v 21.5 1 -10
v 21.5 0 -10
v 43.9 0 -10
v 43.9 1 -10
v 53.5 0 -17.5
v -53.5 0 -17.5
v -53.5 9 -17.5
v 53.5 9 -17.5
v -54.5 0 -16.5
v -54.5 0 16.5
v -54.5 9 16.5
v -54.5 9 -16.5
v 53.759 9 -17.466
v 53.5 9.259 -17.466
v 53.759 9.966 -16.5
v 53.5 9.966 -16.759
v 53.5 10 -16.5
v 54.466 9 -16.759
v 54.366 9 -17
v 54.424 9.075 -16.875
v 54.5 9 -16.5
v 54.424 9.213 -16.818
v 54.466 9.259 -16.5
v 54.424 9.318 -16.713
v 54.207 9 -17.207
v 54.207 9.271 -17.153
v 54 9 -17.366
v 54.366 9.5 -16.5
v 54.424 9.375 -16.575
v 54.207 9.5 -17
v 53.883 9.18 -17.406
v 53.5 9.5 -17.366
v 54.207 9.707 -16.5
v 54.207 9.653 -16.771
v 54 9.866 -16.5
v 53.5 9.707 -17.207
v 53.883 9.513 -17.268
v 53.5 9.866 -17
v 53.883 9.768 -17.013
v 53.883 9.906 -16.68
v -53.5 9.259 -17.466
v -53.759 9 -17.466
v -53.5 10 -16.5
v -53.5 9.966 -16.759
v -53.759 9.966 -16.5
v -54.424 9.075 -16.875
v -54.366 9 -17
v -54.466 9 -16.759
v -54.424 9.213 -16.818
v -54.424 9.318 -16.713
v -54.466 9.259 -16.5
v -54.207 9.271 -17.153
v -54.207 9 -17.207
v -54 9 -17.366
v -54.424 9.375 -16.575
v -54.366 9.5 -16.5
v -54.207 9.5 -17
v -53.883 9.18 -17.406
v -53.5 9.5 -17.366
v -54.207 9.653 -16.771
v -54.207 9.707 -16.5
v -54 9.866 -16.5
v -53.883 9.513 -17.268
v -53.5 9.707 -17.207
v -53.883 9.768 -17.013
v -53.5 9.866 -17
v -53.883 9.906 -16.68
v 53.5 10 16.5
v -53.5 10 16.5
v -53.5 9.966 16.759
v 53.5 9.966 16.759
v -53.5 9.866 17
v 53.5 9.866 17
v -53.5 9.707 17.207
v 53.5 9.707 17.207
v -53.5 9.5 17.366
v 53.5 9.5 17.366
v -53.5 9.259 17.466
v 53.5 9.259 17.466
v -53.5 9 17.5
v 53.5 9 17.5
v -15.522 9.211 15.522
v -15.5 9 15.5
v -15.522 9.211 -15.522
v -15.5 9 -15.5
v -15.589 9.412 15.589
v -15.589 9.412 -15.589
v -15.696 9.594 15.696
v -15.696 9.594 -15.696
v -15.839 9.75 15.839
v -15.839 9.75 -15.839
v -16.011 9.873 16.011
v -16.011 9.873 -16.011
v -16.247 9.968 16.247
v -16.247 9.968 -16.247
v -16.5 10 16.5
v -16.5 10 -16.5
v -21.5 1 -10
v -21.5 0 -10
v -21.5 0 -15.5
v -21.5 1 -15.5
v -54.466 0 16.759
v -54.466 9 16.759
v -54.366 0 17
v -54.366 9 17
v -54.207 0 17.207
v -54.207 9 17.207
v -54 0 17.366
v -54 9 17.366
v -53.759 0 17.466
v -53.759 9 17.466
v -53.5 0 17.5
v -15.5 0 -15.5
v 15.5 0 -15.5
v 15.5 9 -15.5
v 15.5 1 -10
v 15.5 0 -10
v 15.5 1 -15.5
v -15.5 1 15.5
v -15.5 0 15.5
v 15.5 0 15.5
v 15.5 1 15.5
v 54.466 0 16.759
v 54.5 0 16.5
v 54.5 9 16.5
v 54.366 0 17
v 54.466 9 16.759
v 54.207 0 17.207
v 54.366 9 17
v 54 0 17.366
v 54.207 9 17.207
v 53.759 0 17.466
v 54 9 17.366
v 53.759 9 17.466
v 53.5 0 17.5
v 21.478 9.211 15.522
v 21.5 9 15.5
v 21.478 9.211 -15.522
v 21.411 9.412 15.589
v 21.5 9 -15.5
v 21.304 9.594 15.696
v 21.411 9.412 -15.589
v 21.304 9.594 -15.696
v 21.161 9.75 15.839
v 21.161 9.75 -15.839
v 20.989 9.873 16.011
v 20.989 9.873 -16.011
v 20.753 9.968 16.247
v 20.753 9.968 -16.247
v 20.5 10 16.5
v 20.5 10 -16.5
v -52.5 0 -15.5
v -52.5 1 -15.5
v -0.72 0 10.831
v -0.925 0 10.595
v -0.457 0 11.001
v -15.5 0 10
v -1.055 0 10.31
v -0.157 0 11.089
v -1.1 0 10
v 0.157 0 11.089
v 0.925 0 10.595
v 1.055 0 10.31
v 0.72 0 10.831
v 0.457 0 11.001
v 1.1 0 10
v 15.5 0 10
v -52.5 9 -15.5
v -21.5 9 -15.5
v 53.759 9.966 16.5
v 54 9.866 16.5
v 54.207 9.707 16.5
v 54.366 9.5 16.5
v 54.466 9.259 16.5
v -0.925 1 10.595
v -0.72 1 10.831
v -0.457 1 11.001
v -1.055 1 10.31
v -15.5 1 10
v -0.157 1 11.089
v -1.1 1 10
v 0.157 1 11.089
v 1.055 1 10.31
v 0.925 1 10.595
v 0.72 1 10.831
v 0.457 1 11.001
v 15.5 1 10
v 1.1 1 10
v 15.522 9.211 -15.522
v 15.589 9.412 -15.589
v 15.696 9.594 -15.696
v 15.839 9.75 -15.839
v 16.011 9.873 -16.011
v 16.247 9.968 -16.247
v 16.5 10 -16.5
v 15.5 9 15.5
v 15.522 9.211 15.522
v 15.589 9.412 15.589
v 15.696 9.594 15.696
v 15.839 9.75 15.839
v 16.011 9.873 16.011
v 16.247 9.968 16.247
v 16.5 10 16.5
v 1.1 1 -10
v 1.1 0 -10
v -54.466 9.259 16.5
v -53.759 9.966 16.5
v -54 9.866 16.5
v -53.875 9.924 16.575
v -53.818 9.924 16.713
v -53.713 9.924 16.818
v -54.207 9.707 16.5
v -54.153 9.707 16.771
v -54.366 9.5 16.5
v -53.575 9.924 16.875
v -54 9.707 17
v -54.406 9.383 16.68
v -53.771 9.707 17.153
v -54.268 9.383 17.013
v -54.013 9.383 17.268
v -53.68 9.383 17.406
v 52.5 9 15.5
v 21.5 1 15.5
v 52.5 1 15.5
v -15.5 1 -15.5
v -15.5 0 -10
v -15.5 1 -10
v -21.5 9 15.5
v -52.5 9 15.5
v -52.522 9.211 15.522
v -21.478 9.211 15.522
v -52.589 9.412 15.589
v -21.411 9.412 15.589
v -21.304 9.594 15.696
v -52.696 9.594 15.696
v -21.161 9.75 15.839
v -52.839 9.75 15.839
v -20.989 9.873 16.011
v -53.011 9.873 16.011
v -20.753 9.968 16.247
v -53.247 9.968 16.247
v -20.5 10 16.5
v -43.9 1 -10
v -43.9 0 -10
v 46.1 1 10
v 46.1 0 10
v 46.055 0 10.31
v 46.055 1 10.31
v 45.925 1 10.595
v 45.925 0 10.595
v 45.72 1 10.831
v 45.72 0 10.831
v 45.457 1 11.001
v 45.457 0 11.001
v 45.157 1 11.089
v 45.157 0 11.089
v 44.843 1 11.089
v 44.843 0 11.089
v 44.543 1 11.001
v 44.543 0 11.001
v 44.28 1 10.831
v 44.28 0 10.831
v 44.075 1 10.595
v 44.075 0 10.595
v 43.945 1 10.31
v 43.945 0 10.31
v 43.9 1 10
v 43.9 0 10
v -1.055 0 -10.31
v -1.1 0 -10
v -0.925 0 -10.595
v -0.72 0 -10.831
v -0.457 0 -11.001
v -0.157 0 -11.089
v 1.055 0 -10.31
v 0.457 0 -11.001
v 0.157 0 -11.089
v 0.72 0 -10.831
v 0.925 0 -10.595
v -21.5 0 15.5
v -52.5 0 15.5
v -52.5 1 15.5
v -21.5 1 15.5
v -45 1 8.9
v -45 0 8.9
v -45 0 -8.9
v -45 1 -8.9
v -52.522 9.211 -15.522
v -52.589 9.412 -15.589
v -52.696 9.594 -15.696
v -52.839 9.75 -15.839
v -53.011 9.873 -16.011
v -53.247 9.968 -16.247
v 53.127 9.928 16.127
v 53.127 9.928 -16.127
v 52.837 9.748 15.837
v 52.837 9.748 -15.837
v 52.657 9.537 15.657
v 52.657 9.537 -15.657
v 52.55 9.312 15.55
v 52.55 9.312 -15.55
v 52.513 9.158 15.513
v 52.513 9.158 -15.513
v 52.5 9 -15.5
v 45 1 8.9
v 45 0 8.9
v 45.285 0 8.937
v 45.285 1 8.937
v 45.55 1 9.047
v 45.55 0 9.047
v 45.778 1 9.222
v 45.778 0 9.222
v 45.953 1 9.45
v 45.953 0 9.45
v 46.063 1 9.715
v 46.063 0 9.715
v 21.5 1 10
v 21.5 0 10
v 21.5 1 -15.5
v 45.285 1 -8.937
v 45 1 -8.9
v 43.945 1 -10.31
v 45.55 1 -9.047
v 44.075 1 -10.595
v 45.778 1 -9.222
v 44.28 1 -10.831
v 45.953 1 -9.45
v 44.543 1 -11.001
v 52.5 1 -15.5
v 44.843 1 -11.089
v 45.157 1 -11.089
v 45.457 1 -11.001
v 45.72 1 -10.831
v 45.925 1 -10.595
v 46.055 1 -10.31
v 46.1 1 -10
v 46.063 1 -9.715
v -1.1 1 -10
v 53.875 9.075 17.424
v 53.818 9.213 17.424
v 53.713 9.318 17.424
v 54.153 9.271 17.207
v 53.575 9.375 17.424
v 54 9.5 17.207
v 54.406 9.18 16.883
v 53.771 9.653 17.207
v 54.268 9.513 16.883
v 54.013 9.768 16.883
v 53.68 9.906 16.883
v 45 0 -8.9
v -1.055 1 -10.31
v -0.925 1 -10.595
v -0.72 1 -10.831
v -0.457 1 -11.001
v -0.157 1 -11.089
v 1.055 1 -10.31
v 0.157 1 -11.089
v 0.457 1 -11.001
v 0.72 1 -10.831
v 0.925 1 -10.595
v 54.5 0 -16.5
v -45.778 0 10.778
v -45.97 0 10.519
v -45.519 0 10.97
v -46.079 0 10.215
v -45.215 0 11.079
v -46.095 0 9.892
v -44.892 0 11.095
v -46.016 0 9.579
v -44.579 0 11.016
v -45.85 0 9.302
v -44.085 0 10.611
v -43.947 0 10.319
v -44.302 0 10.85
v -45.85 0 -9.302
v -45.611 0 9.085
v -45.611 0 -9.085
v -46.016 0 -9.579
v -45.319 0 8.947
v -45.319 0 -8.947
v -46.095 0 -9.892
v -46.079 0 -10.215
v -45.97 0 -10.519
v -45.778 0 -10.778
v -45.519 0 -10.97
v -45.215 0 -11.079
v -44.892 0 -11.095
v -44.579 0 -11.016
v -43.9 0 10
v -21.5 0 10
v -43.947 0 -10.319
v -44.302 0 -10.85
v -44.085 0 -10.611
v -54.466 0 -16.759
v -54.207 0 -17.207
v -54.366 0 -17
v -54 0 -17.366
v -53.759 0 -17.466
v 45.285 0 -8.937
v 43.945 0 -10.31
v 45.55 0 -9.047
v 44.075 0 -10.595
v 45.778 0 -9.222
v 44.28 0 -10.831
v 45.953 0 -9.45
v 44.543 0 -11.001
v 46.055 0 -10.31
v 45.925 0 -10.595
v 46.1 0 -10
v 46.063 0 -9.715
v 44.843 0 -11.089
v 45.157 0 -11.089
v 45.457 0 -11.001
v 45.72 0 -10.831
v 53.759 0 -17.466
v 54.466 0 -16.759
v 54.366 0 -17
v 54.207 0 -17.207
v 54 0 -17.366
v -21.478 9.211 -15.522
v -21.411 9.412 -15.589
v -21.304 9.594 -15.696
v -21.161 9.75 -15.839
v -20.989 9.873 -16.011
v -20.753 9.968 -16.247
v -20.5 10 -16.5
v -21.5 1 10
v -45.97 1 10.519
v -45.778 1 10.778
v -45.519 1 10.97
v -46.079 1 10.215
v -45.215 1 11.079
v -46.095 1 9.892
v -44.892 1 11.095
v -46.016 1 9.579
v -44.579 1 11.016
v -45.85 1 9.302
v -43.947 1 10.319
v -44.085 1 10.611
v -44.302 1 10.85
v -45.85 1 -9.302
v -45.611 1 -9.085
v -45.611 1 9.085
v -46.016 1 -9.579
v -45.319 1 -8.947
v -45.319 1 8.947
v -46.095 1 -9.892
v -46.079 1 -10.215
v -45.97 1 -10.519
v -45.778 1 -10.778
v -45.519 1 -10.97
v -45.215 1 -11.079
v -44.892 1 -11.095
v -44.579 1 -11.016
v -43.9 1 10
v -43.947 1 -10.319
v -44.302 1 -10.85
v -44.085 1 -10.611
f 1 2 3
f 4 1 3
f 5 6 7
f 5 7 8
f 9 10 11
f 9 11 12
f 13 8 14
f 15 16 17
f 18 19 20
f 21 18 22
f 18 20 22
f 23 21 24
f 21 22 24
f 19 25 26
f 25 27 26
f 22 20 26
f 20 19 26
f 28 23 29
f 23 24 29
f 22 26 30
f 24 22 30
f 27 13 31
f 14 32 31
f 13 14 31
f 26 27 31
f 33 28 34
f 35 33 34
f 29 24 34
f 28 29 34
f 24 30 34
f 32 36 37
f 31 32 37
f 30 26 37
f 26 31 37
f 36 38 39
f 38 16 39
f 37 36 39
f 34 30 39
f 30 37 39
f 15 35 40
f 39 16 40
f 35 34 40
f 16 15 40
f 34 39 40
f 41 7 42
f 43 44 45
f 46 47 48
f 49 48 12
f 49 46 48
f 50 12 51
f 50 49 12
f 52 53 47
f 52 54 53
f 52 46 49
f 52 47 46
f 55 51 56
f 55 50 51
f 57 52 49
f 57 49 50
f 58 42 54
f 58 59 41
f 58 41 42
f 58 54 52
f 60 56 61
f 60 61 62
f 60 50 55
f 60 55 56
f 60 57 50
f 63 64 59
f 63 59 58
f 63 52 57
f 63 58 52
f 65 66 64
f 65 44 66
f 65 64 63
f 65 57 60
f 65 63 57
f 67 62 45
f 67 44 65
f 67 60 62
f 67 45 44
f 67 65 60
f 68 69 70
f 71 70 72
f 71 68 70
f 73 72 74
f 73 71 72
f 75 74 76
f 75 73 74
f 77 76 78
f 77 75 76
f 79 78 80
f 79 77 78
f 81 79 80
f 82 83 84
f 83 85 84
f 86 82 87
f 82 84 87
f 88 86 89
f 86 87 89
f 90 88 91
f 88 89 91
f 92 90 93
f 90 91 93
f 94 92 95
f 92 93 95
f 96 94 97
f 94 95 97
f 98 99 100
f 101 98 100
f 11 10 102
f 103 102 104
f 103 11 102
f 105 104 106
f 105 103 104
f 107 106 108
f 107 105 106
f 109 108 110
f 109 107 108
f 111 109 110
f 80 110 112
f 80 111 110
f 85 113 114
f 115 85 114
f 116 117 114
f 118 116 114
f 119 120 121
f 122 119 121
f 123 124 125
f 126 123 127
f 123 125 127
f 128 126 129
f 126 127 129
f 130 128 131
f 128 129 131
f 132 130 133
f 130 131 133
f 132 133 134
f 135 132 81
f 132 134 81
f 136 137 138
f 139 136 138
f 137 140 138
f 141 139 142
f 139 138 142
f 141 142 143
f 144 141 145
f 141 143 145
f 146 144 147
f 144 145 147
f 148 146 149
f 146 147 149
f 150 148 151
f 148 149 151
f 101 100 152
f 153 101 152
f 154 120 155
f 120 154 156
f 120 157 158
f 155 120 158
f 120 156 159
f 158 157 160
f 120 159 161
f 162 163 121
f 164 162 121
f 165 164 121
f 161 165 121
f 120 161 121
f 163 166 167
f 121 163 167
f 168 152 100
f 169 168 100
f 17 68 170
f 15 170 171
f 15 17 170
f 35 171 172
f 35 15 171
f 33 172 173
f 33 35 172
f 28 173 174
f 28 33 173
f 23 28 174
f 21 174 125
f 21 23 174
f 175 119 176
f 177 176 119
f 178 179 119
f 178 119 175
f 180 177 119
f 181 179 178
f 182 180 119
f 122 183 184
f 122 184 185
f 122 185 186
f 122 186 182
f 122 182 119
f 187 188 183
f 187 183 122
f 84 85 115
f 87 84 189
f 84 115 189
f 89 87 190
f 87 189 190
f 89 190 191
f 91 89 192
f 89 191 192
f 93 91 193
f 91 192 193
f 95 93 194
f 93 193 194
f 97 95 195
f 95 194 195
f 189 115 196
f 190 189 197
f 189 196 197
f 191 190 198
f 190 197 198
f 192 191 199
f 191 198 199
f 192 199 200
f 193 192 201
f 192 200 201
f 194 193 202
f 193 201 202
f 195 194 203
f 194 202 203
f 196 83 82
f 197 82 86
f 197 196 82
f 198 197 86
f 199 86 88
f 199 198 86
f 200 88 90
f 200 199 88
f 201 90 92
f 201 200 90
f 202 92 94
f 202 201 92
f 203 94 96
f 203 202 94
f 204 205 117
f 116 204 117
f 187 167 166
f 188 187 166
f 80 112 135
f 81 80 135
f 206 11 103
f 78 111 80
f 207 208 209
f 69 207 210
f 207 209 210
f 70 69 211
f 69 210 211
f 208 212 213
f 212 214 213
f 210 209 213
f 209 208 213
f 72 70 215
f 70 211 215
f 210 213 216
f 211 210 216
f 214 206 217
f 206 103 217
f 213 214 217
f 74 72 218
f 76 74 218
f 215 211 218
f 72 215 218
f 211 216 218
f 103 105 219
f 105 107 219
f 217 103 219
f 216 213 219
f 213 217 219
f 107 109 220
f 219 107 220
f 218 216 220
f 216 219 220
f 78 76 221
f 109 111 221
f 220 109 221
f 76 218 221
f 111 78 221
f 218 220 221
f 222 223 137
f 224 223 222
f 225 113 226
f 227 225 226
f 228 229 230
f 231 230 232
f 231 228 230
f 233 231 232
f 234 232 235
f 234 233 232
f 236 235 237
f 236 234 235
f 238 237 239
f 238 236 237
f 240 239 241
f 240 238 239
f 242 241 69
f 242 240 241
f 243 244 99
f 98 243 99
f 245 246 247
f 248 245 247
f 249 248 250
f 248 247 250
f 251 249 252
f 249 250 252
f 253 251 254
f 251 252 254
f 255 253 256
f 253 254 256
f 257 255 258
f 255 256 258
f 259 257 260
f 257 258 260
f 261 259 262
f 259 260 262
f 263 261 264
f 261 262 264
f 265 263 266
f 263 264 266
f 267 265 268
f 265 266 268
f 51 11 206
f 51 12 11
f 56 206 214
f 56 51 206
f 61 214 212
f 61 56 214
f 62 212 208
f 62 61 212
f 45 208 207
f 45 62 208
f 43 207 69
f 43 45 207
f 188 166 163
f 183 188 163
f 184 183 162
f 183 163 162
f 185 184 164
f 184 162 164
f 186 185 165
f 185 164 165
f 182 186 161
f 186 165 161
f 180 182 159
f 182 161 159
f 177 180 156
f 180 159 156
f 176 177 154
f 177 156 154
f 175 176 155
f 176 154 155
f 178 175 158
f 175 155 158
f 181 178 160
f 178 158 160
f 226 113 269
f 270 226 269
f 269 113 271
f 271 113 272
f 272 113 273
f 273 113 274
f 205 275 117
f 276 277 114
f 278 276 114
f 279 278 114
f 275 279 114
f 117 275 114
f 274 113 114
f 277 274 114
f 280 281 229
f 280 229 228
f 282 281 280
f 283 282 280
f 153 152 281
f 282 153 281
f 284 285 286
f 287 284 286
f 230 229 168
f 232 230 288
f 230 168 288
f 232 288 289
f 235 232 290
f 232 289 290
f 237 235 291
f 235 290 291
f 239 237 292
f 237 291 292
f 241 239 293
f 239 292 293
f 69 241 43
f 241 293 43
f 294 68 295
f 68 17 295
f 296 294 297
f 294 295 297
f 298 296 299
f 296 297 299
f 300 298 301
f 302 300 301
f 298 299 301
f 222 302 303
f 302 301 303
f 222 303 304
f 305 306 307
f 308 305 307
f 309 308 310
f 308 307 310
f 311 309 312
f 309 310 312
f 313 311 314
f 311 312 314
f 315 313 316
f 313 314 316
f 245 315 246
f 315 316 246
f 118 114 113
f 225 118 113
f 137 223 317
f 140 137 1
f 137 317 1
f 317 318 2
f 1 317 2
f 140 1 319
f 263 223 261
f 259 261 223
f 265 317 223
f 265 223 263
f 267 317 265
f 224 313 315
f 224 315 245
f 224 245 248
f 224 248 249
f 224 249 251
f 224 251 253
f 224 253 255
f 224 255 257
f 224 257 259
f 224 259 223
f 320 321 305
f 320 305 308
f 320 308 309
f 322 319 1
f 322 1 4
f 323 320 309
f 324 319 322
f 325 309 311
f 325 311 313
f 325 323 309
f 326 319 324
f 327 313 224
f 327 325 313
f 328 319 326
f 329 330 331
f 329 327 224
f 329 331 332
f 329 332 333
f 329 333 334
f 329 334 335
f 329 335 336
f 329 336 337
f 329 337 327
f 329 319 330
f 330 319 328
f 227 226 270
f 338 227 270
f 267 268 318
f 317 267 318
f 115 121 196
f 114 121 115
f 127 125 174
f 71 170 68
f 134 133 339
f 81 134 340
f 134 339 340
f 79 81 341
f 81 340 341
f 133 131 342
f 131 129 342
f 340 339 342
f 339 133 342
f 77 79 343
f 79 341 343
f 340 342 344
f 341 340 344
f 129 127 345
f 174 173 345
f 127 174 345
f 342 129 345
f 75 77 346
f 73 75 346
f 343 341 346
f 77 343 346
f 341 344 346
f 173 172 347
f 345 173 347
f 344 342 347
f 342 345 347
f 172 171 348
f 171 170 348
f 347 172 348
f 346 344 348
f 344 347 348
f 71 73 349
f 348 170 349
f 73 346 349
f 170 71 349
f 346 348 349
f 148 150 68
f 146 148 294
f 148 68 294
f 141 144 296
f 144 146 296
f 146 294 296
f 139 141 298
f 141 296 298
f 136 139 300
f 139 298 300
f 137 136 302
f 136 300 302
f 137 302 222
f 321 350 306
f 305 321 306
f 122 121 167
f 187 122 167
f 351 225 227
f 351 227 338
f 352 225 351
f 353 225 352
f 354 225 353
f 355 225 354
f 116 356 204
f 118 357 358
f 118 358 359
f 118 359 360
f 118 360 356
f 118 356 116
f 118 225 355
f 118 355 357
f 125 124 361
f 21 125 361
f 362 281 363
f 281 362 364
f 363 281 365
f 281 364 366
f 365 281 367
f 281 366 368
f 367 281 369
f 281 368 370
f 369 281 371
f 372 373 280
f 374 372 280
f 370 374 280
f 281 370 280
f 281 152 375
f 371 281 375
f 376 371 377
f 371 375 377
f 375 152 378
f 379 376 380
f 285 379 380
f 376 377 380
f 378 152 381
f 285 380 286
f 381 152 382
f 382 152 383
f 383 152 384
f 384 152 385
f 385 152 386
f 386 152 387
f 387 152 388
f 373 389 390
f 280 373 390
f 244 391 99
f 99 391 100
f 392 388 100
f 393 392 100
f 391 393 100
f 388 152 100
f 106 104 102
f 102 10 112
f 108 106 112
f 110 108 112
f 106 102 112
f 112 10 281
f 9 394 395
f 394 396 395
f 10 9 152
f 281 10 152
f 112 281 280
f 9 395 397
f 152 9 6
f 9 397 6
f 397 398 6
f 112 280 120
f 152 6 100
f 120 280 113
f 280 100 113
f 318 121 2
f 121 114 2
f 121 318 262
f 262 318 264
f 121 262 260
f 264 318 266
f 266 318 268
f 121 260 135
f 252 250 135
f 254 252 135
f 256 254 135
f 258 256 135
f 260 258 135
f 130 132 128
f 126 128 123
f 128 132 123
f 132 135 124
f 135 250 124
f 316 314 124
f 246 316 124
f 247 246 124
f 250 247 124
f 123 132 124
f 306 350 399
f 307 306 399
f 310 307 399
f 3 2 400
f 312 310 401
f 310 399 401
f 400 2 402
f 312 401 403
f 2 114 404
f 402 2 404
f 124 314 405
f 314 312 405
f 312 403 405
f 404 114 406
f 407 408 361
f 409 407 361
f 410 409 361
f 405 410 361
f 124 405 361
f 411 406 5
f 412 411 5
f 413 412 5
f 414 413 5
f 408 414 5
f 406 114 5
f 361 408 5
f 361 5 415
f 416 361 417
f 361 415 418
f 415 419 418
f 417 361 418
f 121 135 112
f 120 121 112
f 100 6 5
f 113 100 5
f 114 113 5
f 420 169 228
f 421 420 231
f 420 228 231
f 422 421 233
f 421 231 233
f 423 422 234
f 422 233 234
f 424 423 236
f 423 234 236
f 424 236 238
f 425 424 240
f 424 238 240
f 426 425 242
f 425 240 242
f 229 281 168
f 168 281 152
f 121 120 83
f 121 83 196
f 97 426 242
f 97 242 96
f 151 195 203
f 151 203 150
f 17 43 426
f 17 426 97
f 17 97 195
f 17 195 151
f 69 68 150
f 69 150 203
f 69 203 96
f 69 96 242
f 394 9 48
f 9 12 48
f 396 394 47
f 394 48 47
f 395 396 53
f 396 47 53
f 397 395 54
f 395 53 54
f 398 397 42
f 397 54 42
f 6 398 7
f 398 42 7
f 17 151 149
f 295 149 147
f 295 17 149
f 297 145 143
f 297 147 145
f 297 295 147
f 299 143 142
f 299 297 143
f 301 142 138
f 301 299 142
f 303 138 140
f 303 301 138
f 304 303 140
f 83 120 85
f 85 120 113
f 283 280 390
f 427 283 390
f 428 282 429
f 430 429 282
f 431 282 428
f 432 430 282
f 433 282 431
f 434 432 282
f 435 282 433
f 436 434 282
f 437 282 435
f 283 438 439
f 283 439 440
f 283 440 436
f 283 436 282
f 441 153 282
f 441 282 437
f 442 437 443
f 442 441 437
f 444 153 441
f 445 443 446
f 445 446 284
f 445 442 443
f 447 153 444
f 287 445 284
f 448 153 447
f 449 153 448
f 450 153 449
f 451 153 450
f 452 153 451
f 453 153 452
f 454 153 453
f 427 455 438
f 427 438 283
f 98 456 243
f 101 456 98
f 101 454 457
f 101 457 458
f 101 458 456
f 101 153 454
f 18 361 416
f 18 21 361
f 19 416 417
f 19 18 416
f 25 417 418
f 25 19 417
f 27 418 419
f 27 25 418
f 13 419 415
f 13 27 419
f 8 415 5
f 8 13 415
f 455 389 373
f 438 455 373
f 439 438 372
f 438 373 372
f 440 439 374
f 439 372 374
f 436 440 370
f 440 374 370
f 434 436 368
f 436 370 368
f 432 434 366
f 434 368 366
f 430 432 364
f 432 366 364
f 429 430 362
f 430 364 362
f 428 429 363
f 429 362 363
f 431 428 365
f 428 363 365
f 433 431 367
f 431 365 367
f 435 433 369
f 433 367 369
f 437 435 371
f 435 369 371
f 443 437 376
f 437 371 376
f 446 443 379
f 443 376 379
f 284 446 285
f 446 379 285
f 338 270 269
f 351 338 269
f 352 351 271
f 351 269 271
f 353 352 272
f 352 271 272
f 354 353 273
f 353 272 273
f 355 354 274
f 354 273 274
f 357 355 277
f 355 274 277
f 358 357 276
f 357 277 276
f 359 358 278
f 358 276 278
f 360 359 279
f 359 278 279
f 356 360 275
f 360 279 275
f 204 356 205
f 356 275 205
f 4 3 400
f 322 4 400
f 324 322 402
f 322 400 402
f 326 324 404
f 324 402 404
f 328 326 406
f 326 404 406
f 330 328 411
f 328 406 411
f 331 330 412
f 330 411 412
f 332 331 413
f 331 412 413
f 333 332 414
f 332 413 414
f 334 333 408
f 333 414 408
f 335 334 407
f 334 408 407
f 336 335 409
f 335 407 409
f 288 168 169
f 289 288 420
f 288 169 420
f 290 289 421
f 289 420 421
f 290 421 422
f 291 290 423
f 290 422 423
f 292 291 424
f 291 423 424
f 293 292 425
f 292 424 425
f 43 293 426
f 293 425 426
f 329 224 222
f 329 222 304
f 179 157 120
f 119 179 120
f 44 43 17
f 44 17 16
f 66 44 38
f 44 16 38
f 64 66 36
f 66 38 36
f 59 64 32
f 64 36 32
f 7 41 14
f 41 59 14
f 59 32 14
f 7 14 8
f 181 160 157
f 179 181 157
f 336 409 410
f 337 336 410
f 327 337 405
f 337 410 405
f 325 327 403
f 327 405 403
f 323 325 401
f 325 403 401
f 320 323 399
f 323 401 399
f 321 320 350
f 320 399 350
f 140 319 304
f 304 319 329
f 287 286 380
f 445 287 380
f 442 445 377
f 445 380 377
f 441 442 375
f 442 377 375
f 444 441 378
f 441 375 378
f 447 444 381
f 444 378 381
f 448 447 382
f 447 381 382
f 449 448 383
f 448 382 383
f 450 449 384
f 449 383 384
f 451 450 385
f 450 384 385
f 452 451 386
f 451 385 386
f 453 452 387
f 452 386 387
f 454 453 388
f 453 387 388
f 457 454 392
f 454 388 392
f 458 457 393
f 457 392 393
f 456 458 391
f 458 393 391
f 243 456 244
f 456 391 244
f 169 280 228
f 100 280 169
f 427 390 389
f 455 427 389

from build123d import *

# Parameters (mm, degrees)
EXTRUDE_1_DEPTH   = 1
EXTRUDE_1_2_DEPTH = 1
EXTRUDE_1_3_DEPTH = 1
EXTRUDE_1_4_DEPTH = 1
SKETCH_1_3_W      = 109
SKETCH_1_3_H      = 35
SKETCH_1_3_W_2    = 105
SKETCH_1_3_H_2    = 31
SKETCH_1_3_W_3    = 6
SKETCH_1_3_H_3    = 20
SKETCH_1_3_H_4    = 5.5
EXTRUDE_2_DEPTH   = 10
FILLET_1_R        = 1
FILLET_2_R        = 1


with BuildPart() as part:
    # 草图1 → 凸台-拉伸1 (new body)
    with BuildSketch(Plane(origin=(0, 0, 0), x_dir=(1, 0, 0), z_dir=(0, 1, 0))):
        with BuildLine():
            Line((-21.5, 10), (-21.5, 15.5))
            Line((-21.5, 15.5), (-52.5, 15.5))
            Line((-52.5, 15.5), (-52.5, -15.5))
            Line((-52.5, -15.5), (-21.5, -15.5))
            Line((-21.5, -15.5), (-21.5, -10))
            Line((-21.5, -10), (-43.9, -10))
            ThreePointArc((-43.9, -10), (-45.777817459, -10.777817459), (-45, -8.9))
            Line((-45, -8.9), (-45, 8.9))
            ThreePointArc((-45, 8.9), (-45.777817459, 10.777817459), (-43.9, 10))
            Line((-43.9, 10), (-21.5, 10))
        make_face()
    extrude(amount=EXTRUDE_1_DEPTH)


with BuildPart() as body_2:
    # 草图1 → Extrude 1 2 (new body)
    with BuildSketch(Plane(origin=(0, 0, 0), x_dir=(1, 0, 0), z_dir=(0, 1, 0))):
        with BuildLine():
            Line((-1.1, -10), (-15.5, -10))
            Line((-15.5, -10), (-15.5, -15.5))
            Line((-15.5, -15.5), (15.5, -15.5))
            Line((15.5, -15.5), (15.5, -10))
            Line((15.5, -10), (1.1, -10))
            ThreePointArc((1.1, -10), (0, -11.1), (-1.1, -10))
        make_face()
    extrude(amount=EXTRUDE_1_2_DEPTH)


with BuildPart() as body_3:
    # 草图1 → Extrude 1 3 (new body)
    with BuildSketch(Plane(origin=(0, 0, 0), x_dir=(1, 0, 0), z_dir=(0, 1, 0))):
        with BuildLine():
            Line((15.5, 15.5), (-15.5, 15.5))
            Line((-15.5, 15.5), (-15.5, 10))
            Line((-15.5, 10), (-1.1, 10))
            ThreePointArc((-1.1, 10), (0, 11.1), (1.1, 10))
            Line((1.1, 10), (15.5, 10))
            Line((15.5, 10), (15.5, 15.5))
        make_face()
    extrude(amount=EXTRUDE_1_3_DEPTH)


with BuildPart() as body_4:
    # 草图1 → Extrude 1 4 (new body)
    with BuildSketch(Plane(origin=(0, 0, 0), x_dir=(1, 0, 0), z_dir=(0, 1, 0))):
        with BuildLine():
            Line((52.5, 15.5), (21.5, 15.5))
            Line((21.5, 15.5), (21.5, 10))
            Line((21.5, 10), (43.9, 10))
            ThreePointArc((43.9, 10), (45, 11.1), (46.1, 10))
            ThreePointArc((46.1, 10), (45.777817459, 9.222182541), (45, 8.9))
            Line((45, 8.9), (45, -8.9))
            ThreePointArc((45, -8.9), (45.777817459, -9.222182541), (46.1, -10))
            ThreePointArc((46.1, -10), (45, -11.1), (43.9, -10))
            Line((43.9, -10), (21.5, -10))
            Line((21.5, -10), (21.5, -15.5))
            Line((21.5, -15.5), (52.5, -15.5))
            Line((52.5, -15.5), (52.5, 15.5))
        make_face()
    extrude(amount=EXTRUDE_1_4_DEPTH)

    # 草图1<3> → 凸台-拉伸2 (add)
    # profile 1 of 7: a face of its own
    with BuildSketch(Plane(origin=(0, 0, 0), x_dir=(1, 0, 0), z_dir=(0, 1, 0))):
        Rectangle(SKETCH_1_3_W, SKETCH_1_3_H)
        Rectangle(SKETCH_1_3_W_2, SKETCH_1_3_H_2, mode=Mode.SUBTRACT)
    # profile 2 of 7: a face of its own
    with BuildSketch(Plane(origin=(0, 0, 0), x_dir=(1, 0, 0), z_dir=(0, 1, 0))):
        with Locations((-18.5, 0)):
            Rectangle(SKETCH_1_3_W_3, SKETCH_1_3_H_3)
    # profile 3 of 7: a face of its own
    with BuildSketch(Plane(origin=(0, 0, 0), x_dir=(1, 0, 0), z_dir=(0, 1, 0))):
        with Locations((18.5, 0)):
            Rectangle(SKETCH_1_3_W_3, SKETCH_1_3_H_3)
    # profile 4 of 7: a face of its own
    with BuildSketch(Plane(origin=(0, 0, 0), x_dir=(1, 0, 0), z_dir=(0, 1, 0))):
        with Locations((-18.5, 12.75)):
            Rectangle(SKETCH_1_3_W_3, SKETCH_1_3_H_4)
    # profile 5 of 7: a face of its own
    with BuildSketch(Plane(origin=(0, 0, 0), x_dir=(1, 0, 0), z_dir=(0, 1, 0))):
        with Locations((-18.5, -12.75)):
            Rectangle(SKETCH_1_3_W_3, SKETCH_1_3_H_4)
    # profile 6 of 7: a face of its own
    with BuildSketch(Plane(origin=(0, 0, 0), x_dir=(1, 0, 0), z_dir=(0, 1, 0))):
        with Locations((18.5, 12.75)):
            Rectangle(SKETCH_1_3_W_3, SKETCH_1_3_H_4)
    # profile 7 of 7: a face of its own
    with BuildSketch(Plane(origin=(0, 0, 0), x_dir=(1, 0, 0), z_dir=(0, 1, 0))):
        with Locations((18.5, -12.75)):
            Rectangle(SKETCH_1_3_W_3, SKETCH_1_3_H_4)
    extrude(amount=EXTRUDE_2_DEPTH)

    # 圆角1
    fillet_1_edges = [body_4.edges().sort_by_distance(p)[0] for p in [
        (0, 10, -17.5),
        (54.5, 5, -17.5),
        (-54.5, 5, -17.5),
        (-54.5, 5, 17.5),
        (54.5, 10, 0),
        (54.5, 5, 17.5),
        (-54.5, 10, 0),
        (0, 10, 17.5),
    ]]
    fillet(fillet_1_edges, radius=FILLET_1_R)

    # 圆角2
    fillet_2_edges = [body_4.edges().sort_by_distance(p)[0] for p in [
        (21.5, 10, 0),
        (-37, 10, 15.5),
        (37, 10, 15.5),
        (-15.5, 10, 0),
        (-52.5, 10, 0),
        (0, 10, 15.5),
        (0, 10, -15.5),
        (15.5, 10, 0),
        (37, 10, -15.5),
        (52.5, 10, 0),
        (-37, 10, -15.5),
        (-21.5, 10, 0),
    ]]
    fillet(fillet_2_edges, radius=FILLET_2_R - 0.0001)  # a hair under: the kernel refuses the full size


solid = Compound([part.part, body_2.part, body_3.part, body_4.part])
